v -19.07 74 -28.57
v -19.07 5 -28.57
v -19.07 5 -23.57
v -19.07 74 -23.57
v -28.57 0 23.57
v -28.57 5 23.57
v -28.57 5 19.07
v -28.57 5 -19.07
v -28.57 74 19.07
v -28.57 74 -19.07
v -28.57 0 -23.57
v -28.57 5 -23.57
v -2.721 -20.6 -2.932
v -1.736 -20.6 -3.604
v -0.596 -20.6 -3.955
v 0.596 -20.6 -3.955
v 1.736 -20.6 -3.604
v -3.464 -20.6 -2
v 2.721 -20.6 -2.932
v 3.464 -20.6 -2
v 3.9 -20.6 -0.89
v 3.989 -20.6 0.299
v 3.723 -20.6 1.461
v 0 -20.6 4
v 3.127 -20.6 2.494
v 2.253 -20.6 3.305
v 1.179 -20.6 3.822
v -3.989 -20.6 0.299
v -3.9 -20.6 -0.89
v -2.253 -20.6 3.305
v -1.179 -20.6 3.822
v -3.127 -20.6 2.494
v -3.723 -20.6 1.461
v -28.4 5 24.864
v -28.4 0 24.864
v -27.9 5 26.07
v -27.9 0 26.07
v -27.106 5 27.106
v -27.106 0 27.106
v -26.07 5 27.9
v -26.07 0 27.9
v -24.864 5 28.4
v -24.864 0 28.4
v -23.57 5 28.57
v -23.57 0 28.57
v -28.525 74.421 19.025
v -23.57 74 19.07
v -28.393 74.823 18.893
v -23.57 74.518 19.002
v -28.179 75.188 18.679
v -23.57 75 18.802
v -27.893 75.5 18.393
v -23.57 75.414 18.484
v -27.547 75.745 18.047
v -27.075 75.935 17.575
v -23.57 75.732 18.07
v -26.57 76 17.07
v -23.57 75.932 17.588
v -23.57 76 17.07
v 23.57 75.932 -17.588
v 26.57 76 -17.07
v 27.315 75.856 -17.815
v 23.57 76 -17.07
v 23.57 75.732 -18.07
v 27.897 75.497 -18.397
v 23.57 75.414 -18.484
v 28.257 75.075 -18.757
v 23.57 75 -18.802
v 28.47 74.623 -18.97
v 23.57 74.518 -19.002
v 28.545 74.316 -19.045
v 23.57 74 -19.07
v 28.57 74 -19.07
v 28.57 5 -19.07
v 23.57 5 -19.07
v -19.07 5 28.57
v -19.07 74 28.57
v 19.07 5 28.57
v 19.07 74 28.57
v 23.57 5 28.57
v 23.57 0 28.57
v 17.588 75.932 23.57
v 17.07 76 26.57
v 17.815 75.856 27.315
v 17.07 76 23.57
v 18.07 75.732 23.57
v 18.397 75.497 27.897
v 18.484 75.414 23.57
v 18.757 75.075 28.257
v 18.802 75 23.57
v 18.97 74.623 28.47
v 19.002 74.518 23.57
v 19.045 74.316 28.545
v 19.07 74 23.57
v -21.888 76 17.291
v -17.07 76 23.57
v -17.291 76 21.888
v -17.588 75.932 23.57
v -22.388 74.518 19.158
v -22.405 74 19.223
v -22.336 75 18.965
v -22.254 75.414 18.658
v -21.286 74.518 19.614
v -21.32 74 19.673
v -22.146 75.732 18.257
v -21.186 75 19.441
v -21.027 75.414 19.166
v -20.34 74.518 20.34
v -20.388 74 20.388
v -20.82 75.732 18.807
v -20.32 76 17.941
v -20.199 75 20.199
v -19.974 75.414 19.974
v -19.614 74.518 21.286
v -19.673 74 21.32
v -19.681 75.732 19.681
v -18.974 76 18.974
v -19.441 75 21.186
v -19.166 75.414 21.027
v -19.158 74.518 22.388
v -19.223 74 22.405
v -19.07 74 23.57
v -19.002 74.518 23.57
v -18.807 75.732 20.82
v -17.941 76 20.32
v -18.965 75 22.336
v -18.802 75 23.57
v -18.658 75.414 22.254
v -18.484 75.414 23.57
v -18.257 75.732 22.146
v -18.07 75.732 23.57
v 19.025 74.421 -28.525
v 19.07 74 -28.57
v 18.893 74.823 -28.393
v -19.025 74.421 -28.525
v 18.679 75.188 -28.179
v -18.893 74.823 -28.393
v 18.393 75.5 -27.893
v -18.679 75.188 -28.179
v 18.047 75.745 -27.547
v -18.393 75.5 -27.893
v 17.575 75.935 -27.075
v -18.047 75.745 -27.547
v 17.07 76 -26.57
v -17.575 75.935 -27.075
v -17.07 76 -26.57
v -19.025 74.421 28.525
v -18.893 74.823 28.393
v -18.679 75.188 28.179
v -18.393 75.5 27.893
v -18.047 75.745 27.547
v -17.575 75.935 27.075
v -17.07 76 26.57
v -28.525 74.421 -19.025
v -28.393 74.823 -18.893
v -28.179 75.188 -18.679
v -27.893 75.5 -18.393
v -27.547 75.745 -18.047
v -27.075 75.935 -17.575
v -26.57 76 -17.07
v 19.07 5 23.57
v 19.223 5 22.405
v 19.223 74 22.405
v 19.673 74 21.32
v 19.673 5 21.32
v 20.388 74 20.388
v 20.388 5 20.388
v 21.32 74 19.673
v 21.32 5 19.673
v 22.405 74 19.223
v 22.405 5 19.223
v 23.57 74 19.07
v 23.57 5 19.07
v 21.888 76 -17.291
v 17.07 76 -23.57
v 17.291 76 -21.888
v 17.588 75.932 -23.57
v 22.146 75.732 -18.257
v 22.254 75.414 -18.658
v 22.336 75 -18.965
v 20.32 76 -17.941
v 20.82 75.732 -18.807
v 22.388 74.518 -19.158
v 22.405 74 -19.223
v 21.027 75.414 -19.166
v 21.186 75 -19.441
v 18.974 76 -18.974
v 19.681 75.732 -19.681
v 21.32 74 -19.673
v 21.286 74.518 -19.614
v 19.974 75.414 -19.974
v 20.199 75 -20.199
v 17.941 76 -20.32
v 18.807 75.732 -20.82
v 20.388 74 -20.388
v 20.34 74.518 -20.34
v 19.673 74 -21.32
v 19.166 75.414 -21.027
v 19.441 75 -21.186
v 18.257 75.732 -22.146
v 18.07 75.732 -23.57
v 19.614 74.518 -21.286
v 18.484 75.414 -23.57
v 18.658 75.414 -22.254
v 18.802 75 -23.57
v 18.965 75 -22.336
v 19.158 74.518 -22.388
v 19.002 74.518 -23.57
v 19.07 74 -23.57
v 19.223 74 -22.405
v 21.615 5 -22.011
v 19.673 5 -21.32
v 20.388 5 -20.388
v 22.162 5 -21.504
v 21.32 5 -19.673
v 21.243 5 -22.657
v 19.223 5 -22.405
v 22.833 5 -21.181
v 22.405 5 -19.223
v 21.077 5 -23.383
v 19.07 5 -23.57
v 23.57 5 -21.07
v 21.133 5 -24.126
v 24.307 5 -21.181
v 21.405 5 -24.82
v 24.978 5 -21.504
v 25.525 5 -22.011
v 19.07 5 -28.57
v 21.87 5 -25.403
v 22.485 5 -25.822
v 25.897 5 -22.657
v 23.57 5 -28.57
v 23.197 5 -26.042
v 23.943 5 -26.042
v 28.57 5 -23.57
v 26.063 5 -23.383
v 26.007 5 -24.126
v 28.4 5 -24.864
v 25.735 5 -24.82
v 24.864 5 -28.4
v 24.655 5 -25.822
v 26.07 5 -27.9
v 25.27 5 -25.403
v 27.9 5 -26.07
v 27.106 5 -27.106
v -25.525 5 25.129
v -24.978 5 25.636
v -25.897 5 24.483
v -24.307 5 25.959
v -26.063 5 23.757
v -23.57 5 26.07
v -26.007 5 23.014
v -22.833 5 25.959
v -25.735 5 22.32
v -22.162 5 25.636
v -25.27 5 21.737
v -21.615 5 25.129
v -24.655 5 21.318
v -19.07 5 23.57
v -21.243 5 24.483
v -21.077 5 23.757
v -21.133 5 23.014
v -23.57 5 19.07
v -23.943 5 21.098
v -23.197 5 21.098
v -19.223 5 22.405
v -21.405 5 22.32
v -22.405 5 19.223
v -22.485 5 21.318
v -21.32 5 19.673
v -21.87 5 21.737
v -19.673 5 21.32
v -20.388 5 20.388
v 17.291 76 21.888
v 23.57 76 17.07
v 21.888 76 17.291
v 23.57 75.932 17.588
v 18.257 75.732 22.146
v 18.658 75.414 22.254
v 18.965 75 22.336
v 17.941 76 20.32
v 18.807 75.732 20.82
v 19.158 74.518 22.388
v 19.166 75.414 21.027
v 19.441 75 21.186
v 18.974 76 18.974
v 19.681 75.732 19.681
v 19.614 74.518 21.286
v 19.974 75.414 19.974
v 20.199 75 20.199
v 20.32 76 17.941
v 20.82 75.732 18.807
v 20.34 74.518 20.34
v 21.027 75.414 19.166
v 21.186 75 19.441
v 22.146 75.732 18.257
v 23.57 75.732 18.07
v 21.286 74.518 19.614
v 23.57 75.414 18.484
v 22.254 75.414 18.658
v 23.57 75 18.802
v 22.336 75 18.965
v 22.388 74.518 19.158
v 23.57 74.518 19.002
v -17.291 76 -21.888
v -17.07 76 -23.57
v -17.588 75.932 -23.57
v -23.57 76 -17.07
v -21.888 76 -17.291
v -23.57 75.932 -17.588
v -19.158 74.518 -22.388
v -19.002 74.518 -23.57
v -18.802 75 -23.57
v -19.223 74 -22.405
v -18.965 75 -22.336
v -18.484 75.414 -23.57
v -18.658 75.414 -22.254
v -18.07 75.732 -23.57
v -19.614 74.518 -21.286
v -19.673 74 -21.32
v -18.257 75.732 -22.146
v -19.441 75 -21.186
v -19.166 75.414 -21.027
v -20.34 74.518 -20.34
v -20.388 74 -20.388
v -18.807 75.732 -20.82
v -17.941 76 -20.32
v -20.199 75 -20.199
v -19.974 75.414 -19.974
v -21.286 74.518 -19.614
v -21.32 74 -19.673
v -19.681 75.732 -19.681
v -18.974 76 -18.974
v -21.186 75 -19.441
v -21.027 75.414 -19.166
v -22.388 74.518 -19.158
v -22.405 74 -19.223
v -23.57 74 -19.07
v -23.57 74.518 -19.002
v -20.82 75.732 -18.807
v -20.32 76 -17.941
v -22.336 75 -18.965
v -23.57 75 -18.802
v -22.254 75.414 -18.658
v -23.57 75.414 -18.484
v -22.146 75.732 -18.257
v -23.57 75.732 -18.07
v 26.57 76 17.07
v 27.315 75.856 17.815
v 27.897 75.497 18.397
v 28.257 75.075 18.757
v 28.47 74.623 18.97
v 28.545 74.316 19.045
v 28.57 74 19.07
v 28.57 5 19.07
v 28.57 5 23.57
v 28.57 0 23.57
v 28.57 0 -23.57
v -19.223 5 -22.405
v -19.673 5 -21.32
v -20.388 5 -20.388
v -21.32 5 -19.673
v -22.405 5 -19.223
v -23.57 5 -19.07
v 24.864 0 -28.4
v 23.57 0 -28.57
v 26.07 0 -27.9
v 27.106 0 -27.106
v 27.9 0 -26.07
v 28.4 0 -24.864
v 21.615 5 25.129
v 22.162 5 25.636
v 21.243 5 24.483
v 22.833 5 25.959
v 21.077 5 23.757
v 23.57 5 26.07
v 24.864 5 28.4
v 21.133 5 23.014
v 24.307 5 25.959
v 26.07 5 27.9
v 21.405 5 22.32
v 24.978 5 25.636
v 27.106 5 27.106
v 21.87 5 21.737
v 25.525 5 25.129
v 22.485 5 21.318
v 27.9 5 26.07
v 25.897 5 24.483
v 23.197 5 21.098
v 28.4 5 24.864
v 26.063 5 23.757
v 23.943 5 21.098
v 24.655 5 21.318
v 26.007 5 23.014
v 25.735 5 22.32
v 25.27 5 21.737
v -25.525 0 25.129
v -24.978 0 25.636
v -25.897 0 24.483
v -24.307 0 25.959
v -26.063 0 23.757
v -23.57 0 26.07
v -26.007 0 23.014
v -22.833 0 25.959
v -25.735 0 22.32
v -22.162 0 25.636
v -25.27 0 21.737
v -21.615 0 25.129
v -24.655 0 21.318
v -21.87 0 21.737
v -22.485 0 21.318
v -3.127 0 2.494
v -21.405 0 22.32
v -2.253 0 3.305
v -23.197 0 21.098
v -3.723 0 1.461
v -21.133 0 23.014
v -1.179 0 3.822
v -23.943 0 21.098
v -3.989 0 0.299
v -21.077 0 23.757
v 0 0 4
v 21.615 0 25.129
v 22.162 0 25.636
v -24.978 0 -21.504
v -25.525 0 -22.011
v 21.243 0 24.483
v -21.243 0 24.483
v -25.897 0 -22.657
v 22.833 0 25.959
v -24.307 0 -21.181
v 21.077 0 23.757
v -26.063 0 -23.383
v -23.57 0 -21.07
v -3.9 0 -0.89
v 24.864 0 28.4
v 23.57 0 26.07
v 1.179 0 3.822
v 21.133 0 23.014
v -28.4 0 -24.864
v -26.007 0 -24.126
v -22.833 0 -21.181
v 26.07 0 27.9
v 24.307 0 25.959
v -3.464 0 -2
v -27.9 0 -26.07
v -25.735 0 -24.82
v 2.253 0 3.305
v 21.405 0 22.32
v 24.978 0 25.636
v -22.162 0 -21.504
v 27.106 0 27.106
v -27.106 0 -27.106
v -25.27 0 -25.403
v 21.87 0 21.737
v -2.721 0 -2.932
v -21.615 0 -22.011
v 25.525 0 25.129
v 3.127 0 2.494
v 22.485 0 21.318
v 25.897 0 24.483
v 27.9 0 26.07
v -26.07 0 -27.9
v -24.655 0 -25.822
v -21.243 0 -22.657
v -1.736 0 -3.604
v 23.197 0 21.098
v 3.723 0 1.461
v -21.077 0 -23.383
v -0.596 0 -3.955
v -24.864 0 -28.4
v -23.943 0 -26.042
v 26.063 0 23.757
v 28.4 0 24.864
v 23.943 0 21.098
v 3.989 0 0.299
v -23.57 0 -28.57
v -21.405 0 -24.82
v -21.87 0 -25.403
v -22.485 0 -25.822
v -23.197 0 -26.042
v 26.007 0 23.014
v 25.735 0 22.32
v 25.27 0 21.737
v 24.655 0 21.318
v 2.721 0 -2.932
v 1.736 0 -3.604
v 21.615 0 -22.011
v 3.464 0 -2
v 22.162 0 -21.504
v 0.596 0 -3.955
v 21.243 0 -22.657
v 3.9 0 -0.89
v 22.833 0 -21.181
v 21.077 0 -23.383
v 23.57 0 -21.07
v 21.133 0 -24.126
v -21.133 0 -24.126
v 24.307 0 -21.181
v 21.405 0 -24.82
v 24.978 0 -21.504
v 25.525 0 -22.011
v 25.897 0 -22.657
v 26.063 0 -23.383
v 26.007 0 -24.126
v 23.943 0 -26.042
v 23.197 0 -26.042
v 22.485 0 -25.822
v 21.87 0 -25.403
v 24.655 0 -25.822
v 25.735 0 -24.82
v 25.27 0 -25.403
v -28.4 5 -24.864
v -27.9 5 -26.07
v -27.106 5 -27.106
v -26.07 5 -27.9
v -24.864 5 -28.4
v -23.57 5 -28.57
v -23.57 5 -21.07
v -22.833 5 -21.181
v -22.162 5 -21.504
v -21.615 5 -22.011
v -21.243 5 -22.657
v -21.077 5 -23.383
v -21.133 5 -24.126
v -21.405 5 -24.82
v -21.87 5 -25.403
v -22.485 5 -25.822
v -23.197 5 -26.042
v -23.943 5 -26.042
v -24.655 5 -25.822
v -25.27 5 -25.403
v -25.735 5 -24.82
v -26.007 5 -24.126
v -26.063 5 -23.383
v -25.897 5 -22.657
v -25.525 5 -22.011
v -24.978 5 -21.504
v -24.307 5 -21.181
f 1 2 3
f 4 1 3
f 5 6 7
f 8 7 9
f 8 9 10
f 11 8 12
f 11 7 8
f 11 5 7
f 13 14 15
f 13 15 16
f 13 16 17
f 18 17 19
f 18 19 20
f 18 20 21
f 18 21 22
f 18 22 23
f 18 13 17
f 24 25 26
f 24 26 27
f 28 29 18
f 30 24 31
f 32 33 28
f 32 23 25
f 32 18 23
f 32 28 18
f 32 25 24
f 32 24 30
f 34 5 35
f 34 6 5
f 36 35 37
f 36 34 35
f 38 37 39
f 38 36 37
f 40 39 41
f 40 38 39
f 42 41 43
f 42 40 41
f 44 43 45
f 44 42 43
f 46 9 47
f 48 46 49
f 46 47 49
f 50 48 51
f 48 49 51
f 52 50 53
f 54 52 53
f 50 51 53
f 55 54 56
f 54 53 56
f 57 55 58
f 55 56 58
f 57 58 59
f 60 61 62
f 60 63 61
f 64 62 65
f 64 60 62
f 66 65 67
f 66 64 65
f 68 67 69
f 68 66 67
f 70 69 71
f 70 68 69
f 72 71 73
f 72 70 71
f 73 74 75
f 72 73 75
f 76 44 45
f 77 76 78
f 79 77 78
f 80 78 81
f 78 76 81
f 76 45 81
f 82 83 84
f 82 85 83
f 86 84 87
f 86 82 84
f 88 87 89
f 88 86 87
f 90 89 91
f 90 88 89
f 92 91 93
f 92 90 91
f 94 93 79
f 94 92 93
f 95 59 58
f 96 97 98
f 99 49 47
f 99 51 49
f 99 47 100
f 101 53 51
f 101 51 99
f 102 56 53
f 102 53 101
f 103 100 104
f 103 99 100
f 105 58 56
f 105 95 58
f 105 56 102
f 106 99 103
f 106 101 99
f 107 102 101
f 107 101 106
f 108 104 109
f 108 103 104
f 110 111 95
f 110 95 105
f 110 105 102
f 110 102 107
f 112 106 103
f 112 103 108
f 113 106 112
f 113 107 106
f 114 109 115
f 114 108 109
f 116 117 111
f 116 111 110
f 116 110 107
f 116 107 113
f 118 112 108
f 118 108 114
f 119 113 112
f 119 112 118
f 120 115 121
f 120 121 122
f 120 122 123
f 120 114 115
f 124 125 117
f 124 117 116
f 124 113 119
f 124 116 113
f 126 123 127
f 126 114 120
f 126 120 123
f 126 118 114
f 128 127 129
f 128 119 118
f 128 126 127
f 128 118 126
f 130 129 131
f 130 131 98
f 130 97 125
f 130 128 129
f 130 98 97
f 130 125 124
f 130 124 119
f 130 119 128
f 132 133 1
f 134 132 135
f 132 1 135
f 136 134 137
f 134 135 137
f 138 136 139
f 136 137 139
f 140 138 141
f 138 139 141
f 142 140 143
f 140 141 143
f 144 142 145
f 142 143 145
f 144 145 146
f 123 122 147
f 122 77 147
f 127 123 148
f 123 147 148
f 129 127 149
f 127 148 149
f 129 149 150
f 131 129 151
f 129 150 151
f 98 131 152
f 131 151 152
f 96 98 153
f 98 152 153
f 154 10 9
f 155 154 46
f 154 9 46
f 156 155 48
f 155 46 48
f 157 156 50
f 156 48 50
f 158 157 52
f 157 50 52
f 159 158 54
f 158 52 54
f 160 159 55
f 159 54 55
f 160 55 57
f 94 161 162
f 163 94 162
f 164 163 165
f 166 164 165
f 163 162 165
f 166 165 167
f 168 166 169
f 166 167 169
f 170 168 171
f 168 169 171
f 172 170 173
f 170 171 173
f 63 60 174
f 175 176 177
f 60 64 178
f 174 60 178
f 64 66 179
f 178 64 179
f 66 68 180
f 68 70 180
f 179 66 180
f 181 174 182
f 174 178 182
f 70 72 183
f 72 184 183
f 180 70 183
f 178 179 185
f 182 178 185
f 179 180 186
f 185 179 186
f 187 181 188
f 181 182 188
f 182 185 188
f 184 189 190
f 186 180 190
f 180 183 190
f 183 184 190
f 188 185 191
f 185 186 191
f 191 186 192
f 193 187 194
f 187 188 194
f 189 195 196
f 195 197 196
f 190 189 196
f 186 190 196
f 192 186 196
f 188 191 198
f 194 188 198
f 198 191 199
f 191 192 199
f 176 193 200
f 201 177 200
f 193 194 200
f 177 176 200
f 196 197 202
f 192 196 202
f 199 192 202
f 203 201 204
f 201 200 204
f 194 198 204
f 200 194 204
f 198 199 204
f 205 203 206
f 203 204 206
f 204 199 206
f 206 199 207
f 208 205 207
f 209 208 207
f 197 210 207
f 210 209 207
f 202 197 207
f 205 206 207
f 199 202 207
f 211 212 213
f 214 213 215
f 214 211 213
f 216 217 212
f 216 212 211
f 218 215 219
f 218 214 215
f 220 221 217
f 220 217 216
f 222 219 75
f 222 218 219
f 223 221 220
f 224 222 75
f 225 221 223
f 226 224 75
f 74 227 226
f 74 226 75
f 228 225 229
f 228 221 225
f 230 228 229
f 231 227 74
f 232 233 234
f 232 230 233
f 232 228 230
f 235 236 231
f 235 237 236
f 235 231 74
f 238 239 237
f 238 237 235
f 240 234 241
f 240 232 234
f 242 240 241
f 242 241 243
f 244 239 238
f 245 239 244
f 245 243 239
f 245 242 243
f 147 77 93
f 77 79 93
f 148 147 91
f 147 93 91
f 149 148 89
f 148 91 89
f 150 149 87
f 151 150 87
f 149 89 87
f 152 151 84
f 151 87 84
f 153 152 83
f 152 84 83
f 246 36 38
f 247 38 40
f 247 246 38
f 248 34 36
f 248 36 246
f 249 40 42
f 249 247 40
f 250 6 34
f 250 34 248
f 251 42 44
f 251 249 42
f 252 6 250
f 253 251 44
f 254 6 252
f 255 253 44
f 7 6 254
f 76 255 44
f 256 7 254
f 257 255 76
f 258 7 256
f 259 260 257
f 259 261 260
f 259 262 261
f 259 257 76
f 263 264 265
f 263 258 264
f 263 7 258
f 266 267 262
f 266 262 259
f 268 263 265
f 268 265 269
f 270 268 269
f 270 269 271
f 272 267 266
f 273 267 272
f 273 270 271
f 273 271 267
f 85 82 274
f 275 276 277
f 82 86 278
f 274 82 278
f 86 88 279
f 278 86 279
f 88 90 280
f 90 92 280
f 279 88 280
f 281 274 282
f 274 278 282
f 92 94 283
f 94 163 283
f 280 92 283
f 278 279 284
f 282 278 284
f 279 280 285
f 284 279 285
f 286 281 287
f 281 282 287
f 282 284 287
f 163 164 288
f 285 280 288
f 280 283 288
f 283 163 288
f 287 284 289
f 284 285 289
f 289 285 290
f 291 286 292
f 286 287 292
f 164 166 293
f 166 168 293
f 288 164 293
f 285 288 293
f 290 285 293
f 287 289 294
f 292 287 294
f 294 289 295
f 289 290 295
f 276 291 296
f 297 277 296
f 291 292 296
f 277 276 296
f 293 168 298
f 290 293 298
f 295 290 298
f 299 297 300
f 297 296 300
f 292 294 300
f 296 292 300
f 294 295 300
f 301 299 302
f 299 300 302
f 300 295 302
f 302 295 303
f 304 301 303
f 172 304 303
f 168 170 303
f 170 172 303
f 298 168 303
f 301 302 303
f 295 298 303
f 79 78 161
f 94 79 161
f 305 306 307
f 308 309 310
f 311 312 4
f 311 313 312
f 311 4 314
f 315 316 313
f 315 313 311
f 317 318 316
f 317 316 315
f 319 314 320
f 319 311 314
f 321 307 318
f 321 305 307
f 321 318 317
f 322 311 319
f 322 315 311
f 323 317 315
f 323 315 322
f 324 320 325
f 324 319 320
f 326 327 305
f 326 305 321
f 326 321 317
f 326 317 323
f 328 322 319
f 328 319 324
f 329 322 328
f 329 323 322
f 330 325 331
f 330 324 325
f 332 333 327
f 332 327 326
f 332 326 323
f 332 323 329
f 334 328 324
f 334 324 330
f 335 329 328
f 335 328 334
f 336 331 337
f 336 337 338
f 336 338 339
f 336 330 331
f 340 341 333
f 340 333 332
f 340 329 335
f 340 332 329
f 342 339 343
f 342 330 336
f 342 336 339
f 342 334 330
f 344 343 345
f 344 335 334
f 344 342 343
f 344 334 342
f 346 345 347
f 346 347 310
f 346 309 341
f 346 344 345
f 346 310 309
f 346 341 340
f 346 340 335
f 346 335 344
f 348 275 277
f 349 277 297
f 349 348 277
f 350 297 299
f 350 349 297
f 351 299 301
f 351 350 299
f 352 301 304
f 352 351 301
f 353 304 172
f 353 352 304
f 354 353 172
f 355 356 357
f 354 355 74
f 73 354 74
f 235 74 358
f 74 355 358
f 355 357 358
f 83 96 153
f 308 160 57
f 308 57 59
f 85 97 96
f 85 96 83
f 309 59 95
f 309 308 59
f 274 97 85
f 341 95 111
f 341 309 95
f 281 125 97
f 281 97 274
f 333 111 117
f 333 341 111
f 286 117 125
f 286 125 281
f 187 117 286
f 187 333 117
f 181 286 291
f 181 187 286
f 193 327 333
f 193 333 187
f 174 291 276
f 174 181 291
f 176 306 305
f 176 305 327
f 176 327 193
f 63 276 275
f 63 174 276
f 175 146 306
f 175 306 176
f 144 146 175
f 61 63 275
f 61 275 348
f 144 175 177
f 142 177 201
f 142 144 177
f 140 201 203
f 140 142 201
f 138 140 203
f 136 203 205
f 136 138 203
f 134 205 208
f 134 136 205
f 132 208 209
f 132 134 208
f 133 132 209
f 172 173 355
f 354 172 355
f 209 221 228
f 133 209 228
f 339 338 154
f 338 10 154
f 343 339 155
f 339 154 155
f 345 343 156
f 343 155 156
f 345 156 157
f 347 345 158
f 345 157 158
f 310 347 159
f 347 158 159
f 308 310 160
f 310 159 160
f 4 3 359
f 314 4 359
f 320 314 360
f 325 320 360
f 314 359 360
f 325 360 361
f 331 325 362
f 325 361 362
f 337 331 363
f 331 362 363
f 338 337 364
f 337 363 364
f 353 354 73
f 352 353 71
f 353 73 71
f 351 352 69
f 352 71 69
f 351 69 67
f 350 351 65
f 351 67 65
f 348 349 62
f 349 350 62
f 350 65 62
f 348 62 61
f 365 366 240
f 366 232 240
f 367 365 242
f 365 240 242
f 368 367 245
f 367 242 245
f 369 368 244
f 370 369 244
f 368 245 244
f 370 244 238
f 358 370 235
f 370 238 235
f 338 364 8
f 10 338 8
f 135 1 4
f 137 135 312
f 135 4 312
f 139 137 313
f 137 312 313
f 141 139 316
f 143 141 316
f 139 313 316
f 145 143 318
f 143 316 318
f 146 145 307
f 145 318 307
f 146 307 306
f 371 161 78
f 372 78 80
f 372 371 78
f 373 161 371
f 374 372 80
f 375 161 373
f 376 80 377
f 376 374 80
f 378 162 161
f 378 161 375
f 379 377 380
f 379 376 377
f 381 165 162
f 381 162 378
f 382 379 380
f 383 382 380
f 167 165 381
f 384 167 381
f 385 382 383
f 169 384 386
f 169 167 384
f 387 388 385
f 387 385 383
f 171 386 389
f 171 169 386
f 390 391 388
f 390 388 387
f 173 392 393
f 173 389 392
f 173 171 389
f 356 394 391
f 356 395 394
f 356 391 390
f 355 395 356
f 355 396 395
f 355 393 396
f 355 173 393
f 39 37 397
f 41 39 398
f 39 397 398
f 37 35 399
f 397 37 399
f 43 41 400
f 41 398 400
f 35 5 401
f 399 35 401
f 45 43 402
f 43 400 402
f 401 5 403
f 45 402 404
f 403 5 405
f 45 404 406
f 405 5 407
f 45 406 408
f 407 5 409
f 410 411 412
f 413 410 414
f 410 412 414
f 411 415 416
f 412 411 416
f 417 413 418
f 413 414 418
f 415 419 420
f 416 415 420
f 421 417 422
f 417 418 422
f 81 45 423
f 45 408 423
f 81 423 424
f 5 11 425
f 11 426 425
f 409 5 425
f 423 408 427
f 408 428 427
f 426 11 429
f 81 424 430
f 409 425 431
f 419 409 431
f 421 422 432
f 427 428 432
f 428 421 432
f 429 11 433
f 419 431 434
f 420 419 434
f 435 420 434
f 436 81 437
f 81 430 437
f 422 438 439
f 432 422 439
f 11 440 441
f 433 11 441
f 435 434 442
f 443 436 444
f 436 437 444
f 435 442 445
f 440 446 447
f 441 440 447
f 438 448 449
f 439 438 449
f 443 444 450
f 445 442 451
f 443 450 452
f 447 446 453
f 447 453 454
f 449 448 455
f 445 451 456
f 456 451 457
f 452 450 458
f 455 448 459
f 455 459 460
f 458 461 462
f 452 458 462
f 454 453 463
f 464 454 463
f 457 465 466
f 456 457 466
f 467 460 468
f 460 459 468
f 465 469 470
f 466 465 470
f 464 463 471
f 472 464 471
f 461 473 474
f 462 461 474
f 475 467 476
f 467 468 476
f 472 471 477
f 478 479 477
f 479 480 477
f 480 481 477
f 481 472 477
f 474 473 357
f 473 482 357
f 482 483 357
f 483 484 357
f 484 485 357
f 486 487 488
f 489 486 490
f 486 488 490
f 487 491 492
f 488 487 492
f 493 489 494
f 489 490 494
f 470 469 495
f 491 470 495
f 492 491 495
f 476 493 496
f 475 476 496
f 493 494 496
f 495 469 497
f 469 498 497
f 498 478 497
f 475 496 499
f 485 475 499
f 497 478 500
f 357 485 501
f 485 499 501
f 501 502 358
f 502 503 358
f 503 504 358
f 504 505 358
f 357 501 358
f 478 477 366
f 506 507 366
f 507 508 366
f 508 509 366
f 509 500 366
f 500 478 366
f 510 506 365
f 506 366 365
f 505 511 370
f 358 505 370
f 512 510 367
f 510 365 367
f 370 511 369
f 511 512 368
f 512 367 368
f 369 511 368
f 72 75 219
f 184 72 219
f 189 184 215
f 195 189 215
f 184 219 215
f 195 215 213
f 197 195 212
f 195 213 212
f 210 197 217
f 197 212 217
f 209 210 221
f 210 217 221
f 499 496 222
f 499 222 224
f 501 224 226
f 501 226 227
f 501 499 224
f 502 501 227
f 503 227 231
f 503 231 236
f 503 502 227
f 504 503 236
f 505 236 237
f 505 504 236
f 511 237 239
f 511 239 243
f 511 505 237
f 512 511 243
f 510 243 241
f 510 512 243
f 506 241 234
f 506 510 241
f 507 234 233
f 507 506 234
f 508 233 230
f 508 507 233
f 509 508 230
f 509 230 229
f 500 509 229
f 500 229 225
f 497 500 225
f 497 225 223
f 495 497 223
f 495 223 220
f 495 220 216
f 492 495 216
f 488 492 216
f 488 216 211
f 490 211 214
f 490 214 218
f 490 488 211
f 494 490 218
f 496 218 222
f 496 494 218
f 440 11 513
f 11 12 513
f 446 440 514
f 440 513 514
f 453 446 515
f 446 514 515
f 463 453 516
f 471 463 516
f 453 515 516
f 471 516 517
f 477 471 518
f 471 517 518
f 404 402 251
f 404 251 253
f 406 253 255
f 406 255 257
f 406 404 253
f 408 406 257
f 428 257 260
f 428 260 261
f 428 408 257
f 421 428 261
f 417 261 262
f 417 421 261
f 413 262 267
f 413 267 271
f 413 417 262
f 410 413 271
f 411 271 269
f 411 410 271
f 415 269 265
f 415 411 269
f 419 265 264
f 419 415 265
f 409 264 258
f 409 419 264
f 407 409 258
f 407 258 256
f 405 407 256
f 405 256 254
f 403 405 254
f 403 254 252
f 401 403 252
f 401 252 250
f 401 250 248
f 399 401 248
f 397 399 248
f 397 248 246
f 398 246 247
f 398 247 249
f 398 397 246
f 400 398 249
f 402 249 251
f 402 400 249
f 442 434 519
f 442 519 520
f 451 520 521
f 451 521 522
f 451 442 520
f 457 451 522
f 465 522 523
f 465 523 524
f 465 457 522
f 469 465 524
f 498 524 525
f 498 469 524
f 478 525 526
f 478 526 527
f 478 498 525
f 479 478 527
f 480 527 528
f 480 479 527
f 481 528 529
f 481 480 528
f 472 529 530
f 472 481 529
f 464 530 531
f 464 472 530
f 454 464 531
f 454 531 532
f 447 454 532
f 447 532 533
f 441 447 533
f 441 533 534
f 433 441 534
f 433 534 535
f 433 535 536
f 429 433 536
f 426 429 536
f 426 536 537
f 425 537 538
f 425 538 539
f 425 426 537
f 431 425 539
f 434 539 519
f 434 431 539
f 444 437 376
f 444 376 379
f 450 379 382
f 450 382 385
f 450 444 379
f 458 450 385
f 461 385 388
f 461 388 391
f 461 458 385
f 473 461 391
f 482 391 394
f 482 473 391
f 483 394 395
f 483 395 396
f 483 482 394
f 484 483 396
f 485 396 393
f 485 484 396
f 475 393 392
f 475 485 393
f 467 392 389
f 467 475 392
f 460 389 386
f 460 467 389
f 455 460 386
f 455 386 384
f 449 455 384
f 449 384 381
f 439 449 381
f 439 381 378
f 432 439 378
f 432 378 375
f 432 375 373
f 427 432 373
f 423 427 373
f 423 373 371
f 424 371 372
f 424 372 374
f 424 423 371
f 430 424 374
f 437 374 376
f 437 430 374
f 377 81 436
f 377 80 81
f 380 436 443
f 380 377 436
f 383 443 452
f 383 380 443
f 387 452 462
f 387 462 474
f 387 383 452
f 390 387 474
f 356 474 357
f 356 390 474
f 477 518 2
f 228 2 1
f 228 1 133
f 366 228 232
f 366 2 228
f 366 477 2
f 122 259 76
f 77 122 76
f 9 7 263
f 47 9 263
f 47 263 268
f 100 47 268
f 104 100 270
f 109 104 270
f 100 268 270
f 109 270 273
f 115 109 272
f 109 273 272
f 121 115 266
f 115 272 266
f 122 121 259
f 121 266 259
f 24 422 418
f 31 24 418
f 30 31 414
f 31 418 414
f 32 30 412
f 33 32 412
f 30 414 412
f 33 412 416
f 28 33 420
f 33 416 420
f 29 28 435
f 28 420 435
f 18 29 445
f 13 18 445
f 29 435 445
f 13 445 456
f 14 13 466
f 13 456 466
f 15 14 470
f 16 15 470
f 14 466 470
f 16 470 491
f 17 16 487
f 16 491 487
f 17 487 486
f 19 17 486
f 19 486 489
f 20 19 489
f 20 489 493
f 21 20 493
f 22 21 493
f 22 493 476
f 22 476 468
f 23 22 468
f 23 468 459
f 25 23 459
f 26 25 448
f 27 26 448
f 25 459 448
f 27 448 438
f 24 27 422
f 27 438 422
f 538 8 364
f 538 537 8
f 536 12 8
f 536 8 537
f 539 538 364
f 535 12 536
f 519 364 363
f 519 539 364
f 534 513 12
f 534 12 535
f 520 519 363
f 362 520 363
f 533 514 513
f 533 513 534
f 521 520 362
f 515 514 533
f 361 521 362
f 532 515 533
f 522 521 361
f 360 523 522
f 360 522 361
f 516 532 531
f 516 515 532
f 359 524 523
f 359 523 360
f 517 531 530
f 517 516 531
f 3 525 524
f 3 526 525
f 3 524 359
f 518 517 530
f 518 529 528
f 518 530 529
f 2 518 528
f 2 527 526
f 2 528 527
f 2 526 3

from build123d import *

# Parameters (mm, degrees)
SZKIC1_W                    = 57.14
SZKIC1_H                    = 57.14
SZKIC1_R                    = 2.5
DODANIE_WYCI_GNI_CIE1_DEPTH = 5
DODANIE_WYCI_GNI_CIE2_DEPTH = 71
ZAOKR_GLENIE1_R             = 2
SZKIC3_R                    = 4
DODANIE_WYCI_GNI_CIE3_DEPTH = 20.6
ZAOKR_GLENIE2_R             = 5


with BuildPart() as part:
    # Szkic1 → Dodanie-wyciągnięcie1 (new body)
    with BuildSketch(Plane(origin=(0, 0, 0), x_dir=(1, 0, 0), z_dir=(0, 1, 0))):
        Rectangle(SZKIC1_W, SZKIC1_H)
        with Locations(Location((-23.57, 23.57, 0), (0, 0, 270))):
            Circle(SZKIC1_R, mode=Mode.SUBTRACT)
        with Locations(Location((23.57, 23.57, 0), (0, 0, 270))):
            Circle(SZKIC1_R, mode=Mode.SUBTRACT)
        with Locations(Location((23.57, -23.57, 0), (0, 0, 270))):
            Circle(SZKIC1_R, mode=Mode.SUBTRACT)
        with Locations(Location((-23.57, -23.57, 0), (0, 0, 270))):
            Circle(SZKIC1_R, mode=Mode.SUBTRACT)
    extrude(amount=DODANIE_WYCI_GNI_CIE1_DEPTH)

    # Szkic2 → Dodanie-wyciągnięcie2 (add)
    with BuildSketch(Plane(origin=(0, 5, 0), x_dir=(1, 0, 0), z_dir=(0, 1, 0))):
        with BuildLine():
            ThreePointArc((-19.07, 23.57), (-20.388019485, 20.388019485), (-23.57, 19.07))
            Line((-23.57, 19.07), (-28.57, 19.07))
            Line((-28.57, 19.07), (-28.57, -19.07))
            Line((-28.57, -19.07), (-23.57, -19.07))
            ThreePointArc((-23.57, -19.07), (-20.388019485, -20.388019485), (-19.07, -23.57))
            Line((-19.07, -23.57), (-19.07, -28.57))
            Line((-19.07, -28.57), (19.07, -28.57))
            Line((19.07, -28.57), (19.07, -23.57))
            ThreePointArc((19.07, -23.57), (20.388019485, -20.388019485), (23.57, -19.07))
            Line((23.57, -19.07), (28.57, -19.07))
            Line((28.57, -19.07), (28.57, 19.07))
            Line((28.57, 19.07), (23.57, 19.07))
            ThreePointArc((23.57, 19.07), (20.388019485, 20.388019485), (19.07, 23.57))
            Line((19.07, 23.57), (19.07, 28.57))
            Line((19.07, 28.57), (-19.07, 28.57))
            Line((-19.07, 28.57), (-19.07, 23.57))
        make_face()
    extrude(amount=DODANIE_WYCI_GNI_CIE2_DEPTH)

    # Zaokrąglenie1
    zaokr_glenie1_edges = [part.edges().sort_by_distance(p)[0] for p in [
        (19.07, 76, 26.07),
        (0, 76, 28.57),
        (-19.07, 76, 26.07),
        (-20.388019485, 76, 20.388019485),
        (-26.07, 76, 19.07),
        (-28.57, 76, 0),
        (-26.07, 76, -19.07),
        (-20.388019485, 76, -20.388019485),
        (-19.07, 76, -26.07),
        (0, 76, -28.57),
        (19.07, 76, -26.07),
        (20.388019485, 76, -20.388019485),
        (26.07, 76, -19.07),
        (28.57, 76, 0),
        (26.07, 76, 19.07),
        (20.388019485, 76, 20.388019485),
    ]]
    fillet(zaokr_glenie1_edges, radius=ZAOKR_GLENIE1_R)

    # Szkic3 → Dodanie-wyciągnięcie3 (add)
    with BuildSketch(Plane(origin=(0, 0, 0), x_dir=(-1, 0, 0), z_dir=(0, -1, 0))):
        with Locations(Location((0, 0, 0), (0, 0, 270))):
            Circle(SZKIC3_R)
    extrude(amount=DODANIE_WYCI_GNI_CIE3_DEPTH)

    # Zaokrąglenie2
    zaokr_glenie2_edges = [part.edges().sort_by_distance(p)[0] for p in [
        (-28.57, 2.5, -28.57),
        (28.57, 2.5, -28.57),
        (28.57, 2.5, 28.57),
        (-28.57, 2.5, 28.57),
    ]]
    fillet(zaokr_glenie2_edges, radius=ZAOKR_GLENIE2_R)


solid = part.part
